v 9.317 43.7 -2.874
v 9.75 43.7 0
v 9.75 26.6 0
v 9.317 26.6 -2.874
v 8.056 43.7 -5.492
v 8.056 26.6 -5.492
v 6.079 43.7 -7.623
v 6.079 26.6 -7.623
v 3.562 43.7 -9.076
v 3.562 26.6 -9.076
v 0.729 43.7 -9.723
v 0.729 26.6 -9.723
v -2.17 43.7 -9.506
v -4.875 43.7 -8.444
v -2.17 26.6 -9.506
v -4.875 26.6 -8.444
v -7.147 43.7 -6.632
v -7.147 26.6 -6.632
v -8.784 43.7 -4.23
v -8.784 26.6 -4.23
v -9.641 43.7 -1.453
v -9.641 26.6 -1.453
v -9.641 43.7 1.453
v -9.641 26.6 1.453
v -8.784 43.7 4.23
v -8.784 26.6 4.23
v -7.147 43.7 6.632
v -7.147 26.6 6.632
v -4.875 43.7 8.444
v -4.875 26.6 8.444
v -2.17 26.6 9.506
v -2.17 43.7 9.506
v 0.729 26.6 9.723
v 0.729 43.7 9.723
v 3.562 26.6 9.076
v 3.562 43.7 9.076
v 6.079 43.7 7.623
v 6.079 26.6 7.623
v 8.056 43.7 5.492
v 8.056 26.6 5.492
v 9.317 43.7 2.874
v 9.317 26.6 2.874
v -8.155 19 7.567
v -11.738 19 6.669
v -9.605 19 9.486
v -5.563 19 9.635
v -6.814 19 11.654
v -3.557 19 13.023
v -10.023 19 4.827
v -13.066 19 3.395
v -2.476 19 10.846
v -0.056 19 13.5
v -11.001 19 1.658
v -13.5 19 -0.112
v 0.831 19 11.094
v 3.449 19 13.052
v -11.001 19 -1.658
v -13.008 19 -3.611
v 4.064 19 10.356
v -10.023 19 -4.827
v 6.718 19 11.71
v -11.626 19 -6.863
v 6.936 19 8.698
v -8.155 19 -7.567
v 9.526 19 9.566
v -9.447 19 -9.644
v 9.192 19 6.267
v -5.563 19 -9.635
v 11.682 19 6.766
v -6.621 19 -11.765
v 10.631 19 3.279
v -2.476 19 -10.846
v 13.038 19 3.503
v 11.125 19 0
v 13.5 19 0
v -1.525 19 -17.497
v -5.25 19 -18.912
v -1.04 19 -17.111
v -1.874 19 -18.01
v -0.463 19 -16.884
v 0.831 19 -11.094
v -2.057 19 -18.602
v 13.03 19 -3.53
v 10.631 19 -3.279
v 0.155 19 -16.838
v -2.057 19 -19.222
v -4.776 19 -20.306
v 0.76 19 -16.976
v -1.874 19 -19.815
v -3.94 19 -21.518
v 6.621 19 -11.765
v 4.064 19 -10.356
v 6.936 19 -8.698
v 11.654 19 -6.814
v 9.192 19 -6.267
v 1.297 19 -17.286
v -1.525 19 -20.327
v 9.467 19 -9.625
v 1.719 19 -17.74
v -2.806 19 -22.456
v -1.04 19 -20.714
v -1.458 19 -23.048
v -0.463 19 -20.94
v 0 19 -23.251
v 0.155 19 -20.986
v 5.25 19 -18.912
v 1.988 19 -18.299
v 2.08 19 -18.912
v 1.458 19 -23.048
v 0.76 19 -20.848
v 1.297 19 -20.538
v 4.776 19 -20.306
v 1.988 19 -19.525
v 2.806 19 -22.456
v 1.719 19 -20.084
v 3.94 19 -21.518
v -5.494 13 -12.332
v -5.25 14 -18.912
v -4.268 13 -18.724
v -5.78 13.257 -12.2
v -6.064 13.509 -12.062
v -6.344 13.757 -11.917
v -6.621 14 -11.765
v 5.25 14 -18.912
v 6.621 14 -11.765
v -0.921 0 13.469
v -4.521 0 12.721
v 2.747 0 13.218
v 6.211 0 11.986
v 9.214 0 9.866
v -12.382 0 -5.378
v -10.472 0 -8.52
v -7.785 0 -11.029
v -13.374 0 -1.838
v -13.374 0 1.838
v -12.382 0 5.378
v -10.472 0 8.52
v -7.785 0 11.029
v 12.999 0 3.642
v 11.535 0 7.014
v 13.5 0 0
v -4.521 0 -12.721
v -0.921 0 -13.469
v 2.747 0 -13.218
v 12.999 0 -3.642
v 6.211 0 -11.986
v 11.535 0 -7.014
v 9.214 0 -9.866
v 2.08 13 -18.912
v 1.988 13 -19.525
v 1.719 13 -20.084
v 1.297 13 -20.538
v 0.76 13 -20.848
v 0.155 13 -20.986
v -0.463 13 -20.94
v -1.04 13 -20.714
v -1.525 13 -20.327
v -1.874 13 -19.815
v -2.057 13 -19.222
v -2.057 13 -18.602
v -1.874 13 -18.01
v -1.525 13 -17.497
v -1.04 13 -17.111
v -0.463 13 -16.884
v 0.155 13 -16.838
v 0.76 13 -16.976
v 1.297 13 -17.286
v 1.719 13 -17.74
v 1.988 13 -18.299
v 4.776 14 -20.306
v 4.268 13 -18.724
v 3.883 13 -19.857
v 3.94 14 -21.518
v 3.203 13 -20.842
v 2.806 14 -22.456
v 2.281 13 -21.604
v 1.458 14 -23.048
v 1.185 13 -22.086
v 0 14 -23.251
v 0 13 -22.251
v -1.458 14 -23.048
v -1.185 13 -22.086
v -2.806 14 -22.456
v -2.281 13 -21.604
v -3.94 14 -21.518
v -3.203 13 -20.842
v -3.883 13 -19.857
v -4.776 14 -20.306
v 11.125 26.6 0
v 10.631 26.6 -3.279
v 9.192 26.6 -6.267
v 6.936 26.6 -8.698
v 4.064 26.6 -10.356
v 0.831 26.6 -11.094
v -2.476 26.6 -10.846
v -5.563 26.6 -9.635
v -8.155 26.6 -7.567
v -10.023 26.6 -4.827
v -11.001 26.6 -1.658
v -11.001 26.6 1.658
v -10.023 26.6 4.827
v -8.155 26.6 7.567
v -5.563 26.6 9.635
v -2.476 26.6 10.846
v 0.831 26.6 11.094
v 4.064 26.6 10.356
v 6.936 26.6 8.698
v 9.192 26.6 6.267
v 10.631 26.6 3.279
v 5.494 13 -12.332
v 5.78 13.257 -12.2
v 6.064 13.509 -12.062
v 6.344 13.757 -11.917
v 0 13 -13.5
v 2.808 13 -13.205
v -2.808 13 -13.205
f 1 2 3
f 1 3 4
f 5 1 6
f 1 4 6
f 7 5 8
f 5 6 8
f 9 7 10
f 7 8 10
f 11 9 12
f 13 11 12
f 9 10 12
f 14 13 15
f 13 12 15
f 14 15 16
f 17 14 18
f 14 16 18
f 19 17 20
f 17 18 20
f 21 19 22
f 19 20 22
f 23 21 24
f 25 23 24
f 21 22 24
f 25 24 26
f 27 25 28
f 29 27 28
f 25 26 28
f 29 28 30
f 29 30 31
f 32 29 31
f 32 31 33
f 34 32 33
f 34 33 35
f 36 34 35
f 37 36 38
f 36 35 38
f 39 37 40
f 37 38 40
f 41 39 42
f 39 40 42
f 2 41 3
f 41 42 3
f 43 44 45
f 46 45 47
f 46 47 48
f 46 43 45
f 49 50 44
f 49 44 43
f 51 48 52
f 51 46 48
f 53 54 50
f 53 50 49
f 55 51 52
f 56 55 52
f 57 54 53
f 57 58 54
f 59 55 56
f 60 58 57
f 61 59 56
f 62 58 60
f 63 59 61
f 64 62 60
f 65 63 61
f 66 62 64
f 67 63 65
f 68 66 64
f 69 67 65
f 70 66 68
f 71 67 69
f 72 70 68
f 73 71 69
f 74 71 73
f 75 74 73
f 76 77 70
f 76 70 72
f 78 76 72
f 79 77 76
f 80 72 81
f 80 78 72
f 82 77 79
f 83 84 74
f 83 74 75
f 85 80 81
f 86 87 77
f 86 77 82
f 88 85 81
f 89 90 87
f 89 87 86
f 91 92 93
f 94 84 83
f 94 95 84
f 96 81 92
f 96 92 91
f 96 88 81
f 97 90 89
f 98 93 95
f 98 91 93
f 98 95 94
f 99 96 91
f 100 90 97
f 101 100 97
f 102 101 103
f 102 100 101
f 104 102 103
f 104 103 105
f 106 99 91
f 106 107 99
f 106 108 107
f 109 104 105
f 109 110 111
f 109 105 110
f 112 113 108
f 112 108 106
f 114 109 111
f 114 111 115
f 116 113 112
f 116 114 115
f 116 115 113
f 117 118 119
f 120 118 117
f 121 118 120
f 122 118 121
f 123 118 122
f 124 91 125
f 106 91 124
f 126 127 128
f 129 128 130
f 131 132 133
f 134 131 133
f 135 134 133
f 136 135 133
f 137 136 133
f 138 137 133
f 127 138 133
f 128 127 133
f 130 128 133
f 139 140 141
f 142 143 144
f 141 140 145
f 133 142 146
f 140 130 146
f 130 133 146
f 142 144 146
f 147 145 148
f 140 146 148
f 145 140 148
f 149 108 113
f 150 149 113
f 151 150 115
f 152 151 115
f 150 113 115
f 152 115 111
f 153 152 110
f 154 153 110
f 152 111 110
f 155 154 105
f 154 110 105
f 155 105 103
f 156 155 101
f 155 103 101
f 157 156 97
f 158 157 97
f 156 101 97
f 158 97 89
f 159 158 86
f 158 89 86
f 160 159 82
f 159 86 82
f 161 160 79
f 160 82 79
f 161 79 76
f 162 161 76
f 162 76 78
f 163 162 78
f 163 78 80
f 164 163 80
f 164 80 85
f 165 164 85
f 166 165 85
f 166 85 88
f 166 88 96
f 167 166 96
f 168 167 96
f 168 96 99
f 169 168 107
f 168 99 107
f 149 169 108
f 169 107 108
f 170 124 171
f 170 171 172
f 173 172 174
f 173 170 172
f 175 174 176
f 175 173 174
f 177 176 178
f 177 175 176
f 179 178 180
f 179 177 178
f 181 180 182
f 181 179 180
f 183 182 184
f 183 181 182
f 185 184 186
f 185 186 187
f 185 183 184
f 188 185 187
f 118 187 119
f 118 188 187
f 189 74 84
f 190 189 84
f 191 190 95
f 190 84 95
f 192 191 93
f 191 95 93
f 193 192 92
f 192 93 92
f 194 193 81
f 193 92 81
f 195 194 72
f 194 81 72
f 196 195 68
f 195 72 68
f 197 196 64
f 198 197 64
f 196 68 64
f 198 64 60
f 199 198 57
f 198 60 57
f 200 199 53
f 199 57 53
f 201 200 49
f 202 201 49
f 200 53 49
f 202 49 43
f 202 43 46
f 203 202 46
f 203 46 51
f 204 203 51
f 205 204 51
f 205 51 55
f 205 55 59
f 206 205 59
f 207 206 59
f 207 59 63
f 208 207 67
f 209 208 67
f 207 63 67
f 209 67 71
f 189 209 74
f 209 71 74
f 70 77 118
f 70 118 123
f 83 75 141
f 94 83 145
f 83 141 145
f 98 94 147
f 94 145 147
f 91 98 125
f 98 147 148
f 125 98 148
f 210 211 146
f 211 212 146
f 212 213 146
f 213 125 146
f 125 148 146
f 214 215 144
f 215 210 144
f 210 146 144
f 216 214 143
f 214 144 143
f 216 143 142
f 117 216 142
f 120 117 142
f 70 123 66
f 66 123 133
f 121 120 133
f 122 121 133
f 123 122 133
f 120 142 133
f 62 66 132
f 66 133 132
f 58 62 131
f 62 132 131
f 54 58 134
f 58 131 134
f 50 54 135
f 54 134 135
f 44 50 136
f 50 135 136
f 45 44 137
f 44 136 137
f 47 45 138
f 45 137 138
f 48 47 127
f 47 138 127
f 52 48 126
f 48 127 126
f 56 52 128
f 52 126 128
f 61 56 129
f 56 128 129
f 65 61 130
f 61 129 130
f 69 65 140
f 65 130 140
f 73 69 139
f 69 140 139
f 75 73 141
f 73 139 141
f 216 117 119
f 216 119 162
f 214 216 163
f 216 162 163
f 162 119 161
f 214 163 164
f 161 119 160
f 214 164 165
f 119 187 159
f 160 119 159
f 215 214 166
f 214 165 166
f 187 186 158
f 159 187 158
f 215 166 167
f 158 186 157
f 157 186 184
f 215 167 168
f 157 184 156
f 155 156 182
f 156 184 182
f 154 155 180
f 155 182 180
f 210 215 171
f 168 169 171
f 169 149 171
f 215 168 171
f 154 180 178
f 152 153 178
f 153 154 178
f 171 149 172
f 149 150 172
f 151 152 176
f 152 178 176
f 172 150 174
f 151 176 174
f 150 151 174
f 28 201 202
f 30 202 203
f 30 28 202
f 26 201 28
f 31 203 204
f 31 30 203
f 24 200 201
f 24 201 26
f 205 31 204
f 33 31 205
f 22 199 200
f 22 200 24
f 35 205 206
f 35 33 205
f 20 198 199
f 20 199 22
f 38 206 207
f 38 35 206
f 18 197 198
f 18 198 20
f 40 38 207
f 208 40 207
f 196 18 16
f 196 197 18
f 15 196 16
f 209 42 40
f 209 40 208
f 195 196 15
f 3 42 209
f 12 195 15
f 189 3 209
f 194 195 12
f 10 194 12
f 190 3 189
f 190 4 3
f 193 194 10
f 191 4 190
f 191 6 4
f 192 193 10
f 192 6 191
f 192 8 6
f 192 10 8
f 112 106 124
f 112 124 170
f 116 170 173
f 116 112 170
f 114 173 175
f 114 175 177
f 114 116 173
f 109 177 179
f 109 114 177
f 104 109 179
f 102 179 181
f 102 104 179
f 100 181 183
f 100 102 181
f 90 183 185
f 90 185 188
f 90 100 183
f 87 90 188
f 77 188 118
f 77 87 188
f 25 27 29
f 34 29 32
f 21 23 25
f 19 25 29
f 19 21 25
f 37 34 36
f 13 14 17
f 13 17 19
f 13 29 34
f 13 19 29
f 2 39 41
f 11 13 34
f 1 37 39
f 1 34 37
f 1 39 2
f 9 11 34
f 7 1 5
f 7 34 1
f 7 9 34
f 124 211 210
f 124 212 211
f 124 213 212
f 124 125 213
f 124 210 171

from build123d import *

# Parameters (mm, degrees)
SKETCH1_R           = 13.5
BOSS_EXTRUDE1_DEPTH = 19
BOSS_EXTRUDE2_START = 19
SKETCH1_3_R         = 11.125
BOSS_EXTRUDE2_DEPTH = 7.6
BOSS_EXTRUDE3_START = 26.6
SKETCH1_4_R         = 9.75
BOSS_EXTRUDE3_DEPTH = 17.1
BOSS_EXTRUDE4_START = 19
SKETCH1_5_R         = 2.08
BOSS_EXTRUDE4_DEPTH = 6
CHAMFER1_SIZE       = 1


with BuildPart() as part:
    # Sketch1 → Boss-Extrude1 (new body)
    with BuildSketch(Plane(origin=(0, 0, 0), x_dir=(1, 0, 0), z_dir=(0, 1, 0))):
        Circle(SKETCH1_R)
    extrude(amount=BOSS_EXTRUDE1_DEPTH)

    # Sketch1<3> → Boss-Extrude2 (add)
    with BuildSketch(Plane(origin=(0, 0, 0), x_dir=(1, 0, 0), z_dir=(0, 1, 0)).offset(BOSS_EXTRUDE2_START)):
        Circle(SKETCH1_3_R)
    extrude(amount=BOSS_EXTRUDE2_DEPTH)

    # Sketch1<4> → Boss-Extrude3 (add)
    with BuildSketch(Plane(origin=(0, 0, 0), x_dir=(1, 0, 0), z_dir=(0, 1, 0)).offset(BOSS_EXTRUDE3_START)):
        Circle(SKETCH1_4_R)
    extrude(amount=BOSS_EXTRUDE3_DEPTH)

    # Sketch1<5> → Boss-Extrude4 (add)
    with BuildSketch(Plane(origin=(0, 0, 0), x_dir=(1, 0, 0), z_dir=(0, 1, 0)).offset(BOSS_EXTRUDE4_START)):
        with BuildLine():
            ThreePointArc((5.25, 18.912204045), (0, 23.2511033), (-5.25, 18.912204045))
            Line((-5.25, 18.912204045), (-6.620548595, 11.765132227))
            ThreePointArc((-6.620548595, 11.765132227), (0, 13.5), (6.620548595, 11.765132227))
            Line((6.620548595, 11.765132227), (5.25, 18.912204045))
        make_face()
        with Locations((0, 18.912204045)):
            Circle(SKETCH1_5_R, mode=Mode.SUBTRACT)
    extrude(amount=-BOSS_EXTRUDE4_DEPTH)

    # Chamfer1
    chamfer1_edges = [part.edges().sort_by_distance(p)[0] for p in [
        (0, 13, -23.2511033),
        (5.935274297, 13, -15.338668136),
        (-5.935274297, 13, -15.338668136),
    ]]
    chamfer(chamfer1_edges, length=CHAMFER1_SIZE)


solid = part.part
